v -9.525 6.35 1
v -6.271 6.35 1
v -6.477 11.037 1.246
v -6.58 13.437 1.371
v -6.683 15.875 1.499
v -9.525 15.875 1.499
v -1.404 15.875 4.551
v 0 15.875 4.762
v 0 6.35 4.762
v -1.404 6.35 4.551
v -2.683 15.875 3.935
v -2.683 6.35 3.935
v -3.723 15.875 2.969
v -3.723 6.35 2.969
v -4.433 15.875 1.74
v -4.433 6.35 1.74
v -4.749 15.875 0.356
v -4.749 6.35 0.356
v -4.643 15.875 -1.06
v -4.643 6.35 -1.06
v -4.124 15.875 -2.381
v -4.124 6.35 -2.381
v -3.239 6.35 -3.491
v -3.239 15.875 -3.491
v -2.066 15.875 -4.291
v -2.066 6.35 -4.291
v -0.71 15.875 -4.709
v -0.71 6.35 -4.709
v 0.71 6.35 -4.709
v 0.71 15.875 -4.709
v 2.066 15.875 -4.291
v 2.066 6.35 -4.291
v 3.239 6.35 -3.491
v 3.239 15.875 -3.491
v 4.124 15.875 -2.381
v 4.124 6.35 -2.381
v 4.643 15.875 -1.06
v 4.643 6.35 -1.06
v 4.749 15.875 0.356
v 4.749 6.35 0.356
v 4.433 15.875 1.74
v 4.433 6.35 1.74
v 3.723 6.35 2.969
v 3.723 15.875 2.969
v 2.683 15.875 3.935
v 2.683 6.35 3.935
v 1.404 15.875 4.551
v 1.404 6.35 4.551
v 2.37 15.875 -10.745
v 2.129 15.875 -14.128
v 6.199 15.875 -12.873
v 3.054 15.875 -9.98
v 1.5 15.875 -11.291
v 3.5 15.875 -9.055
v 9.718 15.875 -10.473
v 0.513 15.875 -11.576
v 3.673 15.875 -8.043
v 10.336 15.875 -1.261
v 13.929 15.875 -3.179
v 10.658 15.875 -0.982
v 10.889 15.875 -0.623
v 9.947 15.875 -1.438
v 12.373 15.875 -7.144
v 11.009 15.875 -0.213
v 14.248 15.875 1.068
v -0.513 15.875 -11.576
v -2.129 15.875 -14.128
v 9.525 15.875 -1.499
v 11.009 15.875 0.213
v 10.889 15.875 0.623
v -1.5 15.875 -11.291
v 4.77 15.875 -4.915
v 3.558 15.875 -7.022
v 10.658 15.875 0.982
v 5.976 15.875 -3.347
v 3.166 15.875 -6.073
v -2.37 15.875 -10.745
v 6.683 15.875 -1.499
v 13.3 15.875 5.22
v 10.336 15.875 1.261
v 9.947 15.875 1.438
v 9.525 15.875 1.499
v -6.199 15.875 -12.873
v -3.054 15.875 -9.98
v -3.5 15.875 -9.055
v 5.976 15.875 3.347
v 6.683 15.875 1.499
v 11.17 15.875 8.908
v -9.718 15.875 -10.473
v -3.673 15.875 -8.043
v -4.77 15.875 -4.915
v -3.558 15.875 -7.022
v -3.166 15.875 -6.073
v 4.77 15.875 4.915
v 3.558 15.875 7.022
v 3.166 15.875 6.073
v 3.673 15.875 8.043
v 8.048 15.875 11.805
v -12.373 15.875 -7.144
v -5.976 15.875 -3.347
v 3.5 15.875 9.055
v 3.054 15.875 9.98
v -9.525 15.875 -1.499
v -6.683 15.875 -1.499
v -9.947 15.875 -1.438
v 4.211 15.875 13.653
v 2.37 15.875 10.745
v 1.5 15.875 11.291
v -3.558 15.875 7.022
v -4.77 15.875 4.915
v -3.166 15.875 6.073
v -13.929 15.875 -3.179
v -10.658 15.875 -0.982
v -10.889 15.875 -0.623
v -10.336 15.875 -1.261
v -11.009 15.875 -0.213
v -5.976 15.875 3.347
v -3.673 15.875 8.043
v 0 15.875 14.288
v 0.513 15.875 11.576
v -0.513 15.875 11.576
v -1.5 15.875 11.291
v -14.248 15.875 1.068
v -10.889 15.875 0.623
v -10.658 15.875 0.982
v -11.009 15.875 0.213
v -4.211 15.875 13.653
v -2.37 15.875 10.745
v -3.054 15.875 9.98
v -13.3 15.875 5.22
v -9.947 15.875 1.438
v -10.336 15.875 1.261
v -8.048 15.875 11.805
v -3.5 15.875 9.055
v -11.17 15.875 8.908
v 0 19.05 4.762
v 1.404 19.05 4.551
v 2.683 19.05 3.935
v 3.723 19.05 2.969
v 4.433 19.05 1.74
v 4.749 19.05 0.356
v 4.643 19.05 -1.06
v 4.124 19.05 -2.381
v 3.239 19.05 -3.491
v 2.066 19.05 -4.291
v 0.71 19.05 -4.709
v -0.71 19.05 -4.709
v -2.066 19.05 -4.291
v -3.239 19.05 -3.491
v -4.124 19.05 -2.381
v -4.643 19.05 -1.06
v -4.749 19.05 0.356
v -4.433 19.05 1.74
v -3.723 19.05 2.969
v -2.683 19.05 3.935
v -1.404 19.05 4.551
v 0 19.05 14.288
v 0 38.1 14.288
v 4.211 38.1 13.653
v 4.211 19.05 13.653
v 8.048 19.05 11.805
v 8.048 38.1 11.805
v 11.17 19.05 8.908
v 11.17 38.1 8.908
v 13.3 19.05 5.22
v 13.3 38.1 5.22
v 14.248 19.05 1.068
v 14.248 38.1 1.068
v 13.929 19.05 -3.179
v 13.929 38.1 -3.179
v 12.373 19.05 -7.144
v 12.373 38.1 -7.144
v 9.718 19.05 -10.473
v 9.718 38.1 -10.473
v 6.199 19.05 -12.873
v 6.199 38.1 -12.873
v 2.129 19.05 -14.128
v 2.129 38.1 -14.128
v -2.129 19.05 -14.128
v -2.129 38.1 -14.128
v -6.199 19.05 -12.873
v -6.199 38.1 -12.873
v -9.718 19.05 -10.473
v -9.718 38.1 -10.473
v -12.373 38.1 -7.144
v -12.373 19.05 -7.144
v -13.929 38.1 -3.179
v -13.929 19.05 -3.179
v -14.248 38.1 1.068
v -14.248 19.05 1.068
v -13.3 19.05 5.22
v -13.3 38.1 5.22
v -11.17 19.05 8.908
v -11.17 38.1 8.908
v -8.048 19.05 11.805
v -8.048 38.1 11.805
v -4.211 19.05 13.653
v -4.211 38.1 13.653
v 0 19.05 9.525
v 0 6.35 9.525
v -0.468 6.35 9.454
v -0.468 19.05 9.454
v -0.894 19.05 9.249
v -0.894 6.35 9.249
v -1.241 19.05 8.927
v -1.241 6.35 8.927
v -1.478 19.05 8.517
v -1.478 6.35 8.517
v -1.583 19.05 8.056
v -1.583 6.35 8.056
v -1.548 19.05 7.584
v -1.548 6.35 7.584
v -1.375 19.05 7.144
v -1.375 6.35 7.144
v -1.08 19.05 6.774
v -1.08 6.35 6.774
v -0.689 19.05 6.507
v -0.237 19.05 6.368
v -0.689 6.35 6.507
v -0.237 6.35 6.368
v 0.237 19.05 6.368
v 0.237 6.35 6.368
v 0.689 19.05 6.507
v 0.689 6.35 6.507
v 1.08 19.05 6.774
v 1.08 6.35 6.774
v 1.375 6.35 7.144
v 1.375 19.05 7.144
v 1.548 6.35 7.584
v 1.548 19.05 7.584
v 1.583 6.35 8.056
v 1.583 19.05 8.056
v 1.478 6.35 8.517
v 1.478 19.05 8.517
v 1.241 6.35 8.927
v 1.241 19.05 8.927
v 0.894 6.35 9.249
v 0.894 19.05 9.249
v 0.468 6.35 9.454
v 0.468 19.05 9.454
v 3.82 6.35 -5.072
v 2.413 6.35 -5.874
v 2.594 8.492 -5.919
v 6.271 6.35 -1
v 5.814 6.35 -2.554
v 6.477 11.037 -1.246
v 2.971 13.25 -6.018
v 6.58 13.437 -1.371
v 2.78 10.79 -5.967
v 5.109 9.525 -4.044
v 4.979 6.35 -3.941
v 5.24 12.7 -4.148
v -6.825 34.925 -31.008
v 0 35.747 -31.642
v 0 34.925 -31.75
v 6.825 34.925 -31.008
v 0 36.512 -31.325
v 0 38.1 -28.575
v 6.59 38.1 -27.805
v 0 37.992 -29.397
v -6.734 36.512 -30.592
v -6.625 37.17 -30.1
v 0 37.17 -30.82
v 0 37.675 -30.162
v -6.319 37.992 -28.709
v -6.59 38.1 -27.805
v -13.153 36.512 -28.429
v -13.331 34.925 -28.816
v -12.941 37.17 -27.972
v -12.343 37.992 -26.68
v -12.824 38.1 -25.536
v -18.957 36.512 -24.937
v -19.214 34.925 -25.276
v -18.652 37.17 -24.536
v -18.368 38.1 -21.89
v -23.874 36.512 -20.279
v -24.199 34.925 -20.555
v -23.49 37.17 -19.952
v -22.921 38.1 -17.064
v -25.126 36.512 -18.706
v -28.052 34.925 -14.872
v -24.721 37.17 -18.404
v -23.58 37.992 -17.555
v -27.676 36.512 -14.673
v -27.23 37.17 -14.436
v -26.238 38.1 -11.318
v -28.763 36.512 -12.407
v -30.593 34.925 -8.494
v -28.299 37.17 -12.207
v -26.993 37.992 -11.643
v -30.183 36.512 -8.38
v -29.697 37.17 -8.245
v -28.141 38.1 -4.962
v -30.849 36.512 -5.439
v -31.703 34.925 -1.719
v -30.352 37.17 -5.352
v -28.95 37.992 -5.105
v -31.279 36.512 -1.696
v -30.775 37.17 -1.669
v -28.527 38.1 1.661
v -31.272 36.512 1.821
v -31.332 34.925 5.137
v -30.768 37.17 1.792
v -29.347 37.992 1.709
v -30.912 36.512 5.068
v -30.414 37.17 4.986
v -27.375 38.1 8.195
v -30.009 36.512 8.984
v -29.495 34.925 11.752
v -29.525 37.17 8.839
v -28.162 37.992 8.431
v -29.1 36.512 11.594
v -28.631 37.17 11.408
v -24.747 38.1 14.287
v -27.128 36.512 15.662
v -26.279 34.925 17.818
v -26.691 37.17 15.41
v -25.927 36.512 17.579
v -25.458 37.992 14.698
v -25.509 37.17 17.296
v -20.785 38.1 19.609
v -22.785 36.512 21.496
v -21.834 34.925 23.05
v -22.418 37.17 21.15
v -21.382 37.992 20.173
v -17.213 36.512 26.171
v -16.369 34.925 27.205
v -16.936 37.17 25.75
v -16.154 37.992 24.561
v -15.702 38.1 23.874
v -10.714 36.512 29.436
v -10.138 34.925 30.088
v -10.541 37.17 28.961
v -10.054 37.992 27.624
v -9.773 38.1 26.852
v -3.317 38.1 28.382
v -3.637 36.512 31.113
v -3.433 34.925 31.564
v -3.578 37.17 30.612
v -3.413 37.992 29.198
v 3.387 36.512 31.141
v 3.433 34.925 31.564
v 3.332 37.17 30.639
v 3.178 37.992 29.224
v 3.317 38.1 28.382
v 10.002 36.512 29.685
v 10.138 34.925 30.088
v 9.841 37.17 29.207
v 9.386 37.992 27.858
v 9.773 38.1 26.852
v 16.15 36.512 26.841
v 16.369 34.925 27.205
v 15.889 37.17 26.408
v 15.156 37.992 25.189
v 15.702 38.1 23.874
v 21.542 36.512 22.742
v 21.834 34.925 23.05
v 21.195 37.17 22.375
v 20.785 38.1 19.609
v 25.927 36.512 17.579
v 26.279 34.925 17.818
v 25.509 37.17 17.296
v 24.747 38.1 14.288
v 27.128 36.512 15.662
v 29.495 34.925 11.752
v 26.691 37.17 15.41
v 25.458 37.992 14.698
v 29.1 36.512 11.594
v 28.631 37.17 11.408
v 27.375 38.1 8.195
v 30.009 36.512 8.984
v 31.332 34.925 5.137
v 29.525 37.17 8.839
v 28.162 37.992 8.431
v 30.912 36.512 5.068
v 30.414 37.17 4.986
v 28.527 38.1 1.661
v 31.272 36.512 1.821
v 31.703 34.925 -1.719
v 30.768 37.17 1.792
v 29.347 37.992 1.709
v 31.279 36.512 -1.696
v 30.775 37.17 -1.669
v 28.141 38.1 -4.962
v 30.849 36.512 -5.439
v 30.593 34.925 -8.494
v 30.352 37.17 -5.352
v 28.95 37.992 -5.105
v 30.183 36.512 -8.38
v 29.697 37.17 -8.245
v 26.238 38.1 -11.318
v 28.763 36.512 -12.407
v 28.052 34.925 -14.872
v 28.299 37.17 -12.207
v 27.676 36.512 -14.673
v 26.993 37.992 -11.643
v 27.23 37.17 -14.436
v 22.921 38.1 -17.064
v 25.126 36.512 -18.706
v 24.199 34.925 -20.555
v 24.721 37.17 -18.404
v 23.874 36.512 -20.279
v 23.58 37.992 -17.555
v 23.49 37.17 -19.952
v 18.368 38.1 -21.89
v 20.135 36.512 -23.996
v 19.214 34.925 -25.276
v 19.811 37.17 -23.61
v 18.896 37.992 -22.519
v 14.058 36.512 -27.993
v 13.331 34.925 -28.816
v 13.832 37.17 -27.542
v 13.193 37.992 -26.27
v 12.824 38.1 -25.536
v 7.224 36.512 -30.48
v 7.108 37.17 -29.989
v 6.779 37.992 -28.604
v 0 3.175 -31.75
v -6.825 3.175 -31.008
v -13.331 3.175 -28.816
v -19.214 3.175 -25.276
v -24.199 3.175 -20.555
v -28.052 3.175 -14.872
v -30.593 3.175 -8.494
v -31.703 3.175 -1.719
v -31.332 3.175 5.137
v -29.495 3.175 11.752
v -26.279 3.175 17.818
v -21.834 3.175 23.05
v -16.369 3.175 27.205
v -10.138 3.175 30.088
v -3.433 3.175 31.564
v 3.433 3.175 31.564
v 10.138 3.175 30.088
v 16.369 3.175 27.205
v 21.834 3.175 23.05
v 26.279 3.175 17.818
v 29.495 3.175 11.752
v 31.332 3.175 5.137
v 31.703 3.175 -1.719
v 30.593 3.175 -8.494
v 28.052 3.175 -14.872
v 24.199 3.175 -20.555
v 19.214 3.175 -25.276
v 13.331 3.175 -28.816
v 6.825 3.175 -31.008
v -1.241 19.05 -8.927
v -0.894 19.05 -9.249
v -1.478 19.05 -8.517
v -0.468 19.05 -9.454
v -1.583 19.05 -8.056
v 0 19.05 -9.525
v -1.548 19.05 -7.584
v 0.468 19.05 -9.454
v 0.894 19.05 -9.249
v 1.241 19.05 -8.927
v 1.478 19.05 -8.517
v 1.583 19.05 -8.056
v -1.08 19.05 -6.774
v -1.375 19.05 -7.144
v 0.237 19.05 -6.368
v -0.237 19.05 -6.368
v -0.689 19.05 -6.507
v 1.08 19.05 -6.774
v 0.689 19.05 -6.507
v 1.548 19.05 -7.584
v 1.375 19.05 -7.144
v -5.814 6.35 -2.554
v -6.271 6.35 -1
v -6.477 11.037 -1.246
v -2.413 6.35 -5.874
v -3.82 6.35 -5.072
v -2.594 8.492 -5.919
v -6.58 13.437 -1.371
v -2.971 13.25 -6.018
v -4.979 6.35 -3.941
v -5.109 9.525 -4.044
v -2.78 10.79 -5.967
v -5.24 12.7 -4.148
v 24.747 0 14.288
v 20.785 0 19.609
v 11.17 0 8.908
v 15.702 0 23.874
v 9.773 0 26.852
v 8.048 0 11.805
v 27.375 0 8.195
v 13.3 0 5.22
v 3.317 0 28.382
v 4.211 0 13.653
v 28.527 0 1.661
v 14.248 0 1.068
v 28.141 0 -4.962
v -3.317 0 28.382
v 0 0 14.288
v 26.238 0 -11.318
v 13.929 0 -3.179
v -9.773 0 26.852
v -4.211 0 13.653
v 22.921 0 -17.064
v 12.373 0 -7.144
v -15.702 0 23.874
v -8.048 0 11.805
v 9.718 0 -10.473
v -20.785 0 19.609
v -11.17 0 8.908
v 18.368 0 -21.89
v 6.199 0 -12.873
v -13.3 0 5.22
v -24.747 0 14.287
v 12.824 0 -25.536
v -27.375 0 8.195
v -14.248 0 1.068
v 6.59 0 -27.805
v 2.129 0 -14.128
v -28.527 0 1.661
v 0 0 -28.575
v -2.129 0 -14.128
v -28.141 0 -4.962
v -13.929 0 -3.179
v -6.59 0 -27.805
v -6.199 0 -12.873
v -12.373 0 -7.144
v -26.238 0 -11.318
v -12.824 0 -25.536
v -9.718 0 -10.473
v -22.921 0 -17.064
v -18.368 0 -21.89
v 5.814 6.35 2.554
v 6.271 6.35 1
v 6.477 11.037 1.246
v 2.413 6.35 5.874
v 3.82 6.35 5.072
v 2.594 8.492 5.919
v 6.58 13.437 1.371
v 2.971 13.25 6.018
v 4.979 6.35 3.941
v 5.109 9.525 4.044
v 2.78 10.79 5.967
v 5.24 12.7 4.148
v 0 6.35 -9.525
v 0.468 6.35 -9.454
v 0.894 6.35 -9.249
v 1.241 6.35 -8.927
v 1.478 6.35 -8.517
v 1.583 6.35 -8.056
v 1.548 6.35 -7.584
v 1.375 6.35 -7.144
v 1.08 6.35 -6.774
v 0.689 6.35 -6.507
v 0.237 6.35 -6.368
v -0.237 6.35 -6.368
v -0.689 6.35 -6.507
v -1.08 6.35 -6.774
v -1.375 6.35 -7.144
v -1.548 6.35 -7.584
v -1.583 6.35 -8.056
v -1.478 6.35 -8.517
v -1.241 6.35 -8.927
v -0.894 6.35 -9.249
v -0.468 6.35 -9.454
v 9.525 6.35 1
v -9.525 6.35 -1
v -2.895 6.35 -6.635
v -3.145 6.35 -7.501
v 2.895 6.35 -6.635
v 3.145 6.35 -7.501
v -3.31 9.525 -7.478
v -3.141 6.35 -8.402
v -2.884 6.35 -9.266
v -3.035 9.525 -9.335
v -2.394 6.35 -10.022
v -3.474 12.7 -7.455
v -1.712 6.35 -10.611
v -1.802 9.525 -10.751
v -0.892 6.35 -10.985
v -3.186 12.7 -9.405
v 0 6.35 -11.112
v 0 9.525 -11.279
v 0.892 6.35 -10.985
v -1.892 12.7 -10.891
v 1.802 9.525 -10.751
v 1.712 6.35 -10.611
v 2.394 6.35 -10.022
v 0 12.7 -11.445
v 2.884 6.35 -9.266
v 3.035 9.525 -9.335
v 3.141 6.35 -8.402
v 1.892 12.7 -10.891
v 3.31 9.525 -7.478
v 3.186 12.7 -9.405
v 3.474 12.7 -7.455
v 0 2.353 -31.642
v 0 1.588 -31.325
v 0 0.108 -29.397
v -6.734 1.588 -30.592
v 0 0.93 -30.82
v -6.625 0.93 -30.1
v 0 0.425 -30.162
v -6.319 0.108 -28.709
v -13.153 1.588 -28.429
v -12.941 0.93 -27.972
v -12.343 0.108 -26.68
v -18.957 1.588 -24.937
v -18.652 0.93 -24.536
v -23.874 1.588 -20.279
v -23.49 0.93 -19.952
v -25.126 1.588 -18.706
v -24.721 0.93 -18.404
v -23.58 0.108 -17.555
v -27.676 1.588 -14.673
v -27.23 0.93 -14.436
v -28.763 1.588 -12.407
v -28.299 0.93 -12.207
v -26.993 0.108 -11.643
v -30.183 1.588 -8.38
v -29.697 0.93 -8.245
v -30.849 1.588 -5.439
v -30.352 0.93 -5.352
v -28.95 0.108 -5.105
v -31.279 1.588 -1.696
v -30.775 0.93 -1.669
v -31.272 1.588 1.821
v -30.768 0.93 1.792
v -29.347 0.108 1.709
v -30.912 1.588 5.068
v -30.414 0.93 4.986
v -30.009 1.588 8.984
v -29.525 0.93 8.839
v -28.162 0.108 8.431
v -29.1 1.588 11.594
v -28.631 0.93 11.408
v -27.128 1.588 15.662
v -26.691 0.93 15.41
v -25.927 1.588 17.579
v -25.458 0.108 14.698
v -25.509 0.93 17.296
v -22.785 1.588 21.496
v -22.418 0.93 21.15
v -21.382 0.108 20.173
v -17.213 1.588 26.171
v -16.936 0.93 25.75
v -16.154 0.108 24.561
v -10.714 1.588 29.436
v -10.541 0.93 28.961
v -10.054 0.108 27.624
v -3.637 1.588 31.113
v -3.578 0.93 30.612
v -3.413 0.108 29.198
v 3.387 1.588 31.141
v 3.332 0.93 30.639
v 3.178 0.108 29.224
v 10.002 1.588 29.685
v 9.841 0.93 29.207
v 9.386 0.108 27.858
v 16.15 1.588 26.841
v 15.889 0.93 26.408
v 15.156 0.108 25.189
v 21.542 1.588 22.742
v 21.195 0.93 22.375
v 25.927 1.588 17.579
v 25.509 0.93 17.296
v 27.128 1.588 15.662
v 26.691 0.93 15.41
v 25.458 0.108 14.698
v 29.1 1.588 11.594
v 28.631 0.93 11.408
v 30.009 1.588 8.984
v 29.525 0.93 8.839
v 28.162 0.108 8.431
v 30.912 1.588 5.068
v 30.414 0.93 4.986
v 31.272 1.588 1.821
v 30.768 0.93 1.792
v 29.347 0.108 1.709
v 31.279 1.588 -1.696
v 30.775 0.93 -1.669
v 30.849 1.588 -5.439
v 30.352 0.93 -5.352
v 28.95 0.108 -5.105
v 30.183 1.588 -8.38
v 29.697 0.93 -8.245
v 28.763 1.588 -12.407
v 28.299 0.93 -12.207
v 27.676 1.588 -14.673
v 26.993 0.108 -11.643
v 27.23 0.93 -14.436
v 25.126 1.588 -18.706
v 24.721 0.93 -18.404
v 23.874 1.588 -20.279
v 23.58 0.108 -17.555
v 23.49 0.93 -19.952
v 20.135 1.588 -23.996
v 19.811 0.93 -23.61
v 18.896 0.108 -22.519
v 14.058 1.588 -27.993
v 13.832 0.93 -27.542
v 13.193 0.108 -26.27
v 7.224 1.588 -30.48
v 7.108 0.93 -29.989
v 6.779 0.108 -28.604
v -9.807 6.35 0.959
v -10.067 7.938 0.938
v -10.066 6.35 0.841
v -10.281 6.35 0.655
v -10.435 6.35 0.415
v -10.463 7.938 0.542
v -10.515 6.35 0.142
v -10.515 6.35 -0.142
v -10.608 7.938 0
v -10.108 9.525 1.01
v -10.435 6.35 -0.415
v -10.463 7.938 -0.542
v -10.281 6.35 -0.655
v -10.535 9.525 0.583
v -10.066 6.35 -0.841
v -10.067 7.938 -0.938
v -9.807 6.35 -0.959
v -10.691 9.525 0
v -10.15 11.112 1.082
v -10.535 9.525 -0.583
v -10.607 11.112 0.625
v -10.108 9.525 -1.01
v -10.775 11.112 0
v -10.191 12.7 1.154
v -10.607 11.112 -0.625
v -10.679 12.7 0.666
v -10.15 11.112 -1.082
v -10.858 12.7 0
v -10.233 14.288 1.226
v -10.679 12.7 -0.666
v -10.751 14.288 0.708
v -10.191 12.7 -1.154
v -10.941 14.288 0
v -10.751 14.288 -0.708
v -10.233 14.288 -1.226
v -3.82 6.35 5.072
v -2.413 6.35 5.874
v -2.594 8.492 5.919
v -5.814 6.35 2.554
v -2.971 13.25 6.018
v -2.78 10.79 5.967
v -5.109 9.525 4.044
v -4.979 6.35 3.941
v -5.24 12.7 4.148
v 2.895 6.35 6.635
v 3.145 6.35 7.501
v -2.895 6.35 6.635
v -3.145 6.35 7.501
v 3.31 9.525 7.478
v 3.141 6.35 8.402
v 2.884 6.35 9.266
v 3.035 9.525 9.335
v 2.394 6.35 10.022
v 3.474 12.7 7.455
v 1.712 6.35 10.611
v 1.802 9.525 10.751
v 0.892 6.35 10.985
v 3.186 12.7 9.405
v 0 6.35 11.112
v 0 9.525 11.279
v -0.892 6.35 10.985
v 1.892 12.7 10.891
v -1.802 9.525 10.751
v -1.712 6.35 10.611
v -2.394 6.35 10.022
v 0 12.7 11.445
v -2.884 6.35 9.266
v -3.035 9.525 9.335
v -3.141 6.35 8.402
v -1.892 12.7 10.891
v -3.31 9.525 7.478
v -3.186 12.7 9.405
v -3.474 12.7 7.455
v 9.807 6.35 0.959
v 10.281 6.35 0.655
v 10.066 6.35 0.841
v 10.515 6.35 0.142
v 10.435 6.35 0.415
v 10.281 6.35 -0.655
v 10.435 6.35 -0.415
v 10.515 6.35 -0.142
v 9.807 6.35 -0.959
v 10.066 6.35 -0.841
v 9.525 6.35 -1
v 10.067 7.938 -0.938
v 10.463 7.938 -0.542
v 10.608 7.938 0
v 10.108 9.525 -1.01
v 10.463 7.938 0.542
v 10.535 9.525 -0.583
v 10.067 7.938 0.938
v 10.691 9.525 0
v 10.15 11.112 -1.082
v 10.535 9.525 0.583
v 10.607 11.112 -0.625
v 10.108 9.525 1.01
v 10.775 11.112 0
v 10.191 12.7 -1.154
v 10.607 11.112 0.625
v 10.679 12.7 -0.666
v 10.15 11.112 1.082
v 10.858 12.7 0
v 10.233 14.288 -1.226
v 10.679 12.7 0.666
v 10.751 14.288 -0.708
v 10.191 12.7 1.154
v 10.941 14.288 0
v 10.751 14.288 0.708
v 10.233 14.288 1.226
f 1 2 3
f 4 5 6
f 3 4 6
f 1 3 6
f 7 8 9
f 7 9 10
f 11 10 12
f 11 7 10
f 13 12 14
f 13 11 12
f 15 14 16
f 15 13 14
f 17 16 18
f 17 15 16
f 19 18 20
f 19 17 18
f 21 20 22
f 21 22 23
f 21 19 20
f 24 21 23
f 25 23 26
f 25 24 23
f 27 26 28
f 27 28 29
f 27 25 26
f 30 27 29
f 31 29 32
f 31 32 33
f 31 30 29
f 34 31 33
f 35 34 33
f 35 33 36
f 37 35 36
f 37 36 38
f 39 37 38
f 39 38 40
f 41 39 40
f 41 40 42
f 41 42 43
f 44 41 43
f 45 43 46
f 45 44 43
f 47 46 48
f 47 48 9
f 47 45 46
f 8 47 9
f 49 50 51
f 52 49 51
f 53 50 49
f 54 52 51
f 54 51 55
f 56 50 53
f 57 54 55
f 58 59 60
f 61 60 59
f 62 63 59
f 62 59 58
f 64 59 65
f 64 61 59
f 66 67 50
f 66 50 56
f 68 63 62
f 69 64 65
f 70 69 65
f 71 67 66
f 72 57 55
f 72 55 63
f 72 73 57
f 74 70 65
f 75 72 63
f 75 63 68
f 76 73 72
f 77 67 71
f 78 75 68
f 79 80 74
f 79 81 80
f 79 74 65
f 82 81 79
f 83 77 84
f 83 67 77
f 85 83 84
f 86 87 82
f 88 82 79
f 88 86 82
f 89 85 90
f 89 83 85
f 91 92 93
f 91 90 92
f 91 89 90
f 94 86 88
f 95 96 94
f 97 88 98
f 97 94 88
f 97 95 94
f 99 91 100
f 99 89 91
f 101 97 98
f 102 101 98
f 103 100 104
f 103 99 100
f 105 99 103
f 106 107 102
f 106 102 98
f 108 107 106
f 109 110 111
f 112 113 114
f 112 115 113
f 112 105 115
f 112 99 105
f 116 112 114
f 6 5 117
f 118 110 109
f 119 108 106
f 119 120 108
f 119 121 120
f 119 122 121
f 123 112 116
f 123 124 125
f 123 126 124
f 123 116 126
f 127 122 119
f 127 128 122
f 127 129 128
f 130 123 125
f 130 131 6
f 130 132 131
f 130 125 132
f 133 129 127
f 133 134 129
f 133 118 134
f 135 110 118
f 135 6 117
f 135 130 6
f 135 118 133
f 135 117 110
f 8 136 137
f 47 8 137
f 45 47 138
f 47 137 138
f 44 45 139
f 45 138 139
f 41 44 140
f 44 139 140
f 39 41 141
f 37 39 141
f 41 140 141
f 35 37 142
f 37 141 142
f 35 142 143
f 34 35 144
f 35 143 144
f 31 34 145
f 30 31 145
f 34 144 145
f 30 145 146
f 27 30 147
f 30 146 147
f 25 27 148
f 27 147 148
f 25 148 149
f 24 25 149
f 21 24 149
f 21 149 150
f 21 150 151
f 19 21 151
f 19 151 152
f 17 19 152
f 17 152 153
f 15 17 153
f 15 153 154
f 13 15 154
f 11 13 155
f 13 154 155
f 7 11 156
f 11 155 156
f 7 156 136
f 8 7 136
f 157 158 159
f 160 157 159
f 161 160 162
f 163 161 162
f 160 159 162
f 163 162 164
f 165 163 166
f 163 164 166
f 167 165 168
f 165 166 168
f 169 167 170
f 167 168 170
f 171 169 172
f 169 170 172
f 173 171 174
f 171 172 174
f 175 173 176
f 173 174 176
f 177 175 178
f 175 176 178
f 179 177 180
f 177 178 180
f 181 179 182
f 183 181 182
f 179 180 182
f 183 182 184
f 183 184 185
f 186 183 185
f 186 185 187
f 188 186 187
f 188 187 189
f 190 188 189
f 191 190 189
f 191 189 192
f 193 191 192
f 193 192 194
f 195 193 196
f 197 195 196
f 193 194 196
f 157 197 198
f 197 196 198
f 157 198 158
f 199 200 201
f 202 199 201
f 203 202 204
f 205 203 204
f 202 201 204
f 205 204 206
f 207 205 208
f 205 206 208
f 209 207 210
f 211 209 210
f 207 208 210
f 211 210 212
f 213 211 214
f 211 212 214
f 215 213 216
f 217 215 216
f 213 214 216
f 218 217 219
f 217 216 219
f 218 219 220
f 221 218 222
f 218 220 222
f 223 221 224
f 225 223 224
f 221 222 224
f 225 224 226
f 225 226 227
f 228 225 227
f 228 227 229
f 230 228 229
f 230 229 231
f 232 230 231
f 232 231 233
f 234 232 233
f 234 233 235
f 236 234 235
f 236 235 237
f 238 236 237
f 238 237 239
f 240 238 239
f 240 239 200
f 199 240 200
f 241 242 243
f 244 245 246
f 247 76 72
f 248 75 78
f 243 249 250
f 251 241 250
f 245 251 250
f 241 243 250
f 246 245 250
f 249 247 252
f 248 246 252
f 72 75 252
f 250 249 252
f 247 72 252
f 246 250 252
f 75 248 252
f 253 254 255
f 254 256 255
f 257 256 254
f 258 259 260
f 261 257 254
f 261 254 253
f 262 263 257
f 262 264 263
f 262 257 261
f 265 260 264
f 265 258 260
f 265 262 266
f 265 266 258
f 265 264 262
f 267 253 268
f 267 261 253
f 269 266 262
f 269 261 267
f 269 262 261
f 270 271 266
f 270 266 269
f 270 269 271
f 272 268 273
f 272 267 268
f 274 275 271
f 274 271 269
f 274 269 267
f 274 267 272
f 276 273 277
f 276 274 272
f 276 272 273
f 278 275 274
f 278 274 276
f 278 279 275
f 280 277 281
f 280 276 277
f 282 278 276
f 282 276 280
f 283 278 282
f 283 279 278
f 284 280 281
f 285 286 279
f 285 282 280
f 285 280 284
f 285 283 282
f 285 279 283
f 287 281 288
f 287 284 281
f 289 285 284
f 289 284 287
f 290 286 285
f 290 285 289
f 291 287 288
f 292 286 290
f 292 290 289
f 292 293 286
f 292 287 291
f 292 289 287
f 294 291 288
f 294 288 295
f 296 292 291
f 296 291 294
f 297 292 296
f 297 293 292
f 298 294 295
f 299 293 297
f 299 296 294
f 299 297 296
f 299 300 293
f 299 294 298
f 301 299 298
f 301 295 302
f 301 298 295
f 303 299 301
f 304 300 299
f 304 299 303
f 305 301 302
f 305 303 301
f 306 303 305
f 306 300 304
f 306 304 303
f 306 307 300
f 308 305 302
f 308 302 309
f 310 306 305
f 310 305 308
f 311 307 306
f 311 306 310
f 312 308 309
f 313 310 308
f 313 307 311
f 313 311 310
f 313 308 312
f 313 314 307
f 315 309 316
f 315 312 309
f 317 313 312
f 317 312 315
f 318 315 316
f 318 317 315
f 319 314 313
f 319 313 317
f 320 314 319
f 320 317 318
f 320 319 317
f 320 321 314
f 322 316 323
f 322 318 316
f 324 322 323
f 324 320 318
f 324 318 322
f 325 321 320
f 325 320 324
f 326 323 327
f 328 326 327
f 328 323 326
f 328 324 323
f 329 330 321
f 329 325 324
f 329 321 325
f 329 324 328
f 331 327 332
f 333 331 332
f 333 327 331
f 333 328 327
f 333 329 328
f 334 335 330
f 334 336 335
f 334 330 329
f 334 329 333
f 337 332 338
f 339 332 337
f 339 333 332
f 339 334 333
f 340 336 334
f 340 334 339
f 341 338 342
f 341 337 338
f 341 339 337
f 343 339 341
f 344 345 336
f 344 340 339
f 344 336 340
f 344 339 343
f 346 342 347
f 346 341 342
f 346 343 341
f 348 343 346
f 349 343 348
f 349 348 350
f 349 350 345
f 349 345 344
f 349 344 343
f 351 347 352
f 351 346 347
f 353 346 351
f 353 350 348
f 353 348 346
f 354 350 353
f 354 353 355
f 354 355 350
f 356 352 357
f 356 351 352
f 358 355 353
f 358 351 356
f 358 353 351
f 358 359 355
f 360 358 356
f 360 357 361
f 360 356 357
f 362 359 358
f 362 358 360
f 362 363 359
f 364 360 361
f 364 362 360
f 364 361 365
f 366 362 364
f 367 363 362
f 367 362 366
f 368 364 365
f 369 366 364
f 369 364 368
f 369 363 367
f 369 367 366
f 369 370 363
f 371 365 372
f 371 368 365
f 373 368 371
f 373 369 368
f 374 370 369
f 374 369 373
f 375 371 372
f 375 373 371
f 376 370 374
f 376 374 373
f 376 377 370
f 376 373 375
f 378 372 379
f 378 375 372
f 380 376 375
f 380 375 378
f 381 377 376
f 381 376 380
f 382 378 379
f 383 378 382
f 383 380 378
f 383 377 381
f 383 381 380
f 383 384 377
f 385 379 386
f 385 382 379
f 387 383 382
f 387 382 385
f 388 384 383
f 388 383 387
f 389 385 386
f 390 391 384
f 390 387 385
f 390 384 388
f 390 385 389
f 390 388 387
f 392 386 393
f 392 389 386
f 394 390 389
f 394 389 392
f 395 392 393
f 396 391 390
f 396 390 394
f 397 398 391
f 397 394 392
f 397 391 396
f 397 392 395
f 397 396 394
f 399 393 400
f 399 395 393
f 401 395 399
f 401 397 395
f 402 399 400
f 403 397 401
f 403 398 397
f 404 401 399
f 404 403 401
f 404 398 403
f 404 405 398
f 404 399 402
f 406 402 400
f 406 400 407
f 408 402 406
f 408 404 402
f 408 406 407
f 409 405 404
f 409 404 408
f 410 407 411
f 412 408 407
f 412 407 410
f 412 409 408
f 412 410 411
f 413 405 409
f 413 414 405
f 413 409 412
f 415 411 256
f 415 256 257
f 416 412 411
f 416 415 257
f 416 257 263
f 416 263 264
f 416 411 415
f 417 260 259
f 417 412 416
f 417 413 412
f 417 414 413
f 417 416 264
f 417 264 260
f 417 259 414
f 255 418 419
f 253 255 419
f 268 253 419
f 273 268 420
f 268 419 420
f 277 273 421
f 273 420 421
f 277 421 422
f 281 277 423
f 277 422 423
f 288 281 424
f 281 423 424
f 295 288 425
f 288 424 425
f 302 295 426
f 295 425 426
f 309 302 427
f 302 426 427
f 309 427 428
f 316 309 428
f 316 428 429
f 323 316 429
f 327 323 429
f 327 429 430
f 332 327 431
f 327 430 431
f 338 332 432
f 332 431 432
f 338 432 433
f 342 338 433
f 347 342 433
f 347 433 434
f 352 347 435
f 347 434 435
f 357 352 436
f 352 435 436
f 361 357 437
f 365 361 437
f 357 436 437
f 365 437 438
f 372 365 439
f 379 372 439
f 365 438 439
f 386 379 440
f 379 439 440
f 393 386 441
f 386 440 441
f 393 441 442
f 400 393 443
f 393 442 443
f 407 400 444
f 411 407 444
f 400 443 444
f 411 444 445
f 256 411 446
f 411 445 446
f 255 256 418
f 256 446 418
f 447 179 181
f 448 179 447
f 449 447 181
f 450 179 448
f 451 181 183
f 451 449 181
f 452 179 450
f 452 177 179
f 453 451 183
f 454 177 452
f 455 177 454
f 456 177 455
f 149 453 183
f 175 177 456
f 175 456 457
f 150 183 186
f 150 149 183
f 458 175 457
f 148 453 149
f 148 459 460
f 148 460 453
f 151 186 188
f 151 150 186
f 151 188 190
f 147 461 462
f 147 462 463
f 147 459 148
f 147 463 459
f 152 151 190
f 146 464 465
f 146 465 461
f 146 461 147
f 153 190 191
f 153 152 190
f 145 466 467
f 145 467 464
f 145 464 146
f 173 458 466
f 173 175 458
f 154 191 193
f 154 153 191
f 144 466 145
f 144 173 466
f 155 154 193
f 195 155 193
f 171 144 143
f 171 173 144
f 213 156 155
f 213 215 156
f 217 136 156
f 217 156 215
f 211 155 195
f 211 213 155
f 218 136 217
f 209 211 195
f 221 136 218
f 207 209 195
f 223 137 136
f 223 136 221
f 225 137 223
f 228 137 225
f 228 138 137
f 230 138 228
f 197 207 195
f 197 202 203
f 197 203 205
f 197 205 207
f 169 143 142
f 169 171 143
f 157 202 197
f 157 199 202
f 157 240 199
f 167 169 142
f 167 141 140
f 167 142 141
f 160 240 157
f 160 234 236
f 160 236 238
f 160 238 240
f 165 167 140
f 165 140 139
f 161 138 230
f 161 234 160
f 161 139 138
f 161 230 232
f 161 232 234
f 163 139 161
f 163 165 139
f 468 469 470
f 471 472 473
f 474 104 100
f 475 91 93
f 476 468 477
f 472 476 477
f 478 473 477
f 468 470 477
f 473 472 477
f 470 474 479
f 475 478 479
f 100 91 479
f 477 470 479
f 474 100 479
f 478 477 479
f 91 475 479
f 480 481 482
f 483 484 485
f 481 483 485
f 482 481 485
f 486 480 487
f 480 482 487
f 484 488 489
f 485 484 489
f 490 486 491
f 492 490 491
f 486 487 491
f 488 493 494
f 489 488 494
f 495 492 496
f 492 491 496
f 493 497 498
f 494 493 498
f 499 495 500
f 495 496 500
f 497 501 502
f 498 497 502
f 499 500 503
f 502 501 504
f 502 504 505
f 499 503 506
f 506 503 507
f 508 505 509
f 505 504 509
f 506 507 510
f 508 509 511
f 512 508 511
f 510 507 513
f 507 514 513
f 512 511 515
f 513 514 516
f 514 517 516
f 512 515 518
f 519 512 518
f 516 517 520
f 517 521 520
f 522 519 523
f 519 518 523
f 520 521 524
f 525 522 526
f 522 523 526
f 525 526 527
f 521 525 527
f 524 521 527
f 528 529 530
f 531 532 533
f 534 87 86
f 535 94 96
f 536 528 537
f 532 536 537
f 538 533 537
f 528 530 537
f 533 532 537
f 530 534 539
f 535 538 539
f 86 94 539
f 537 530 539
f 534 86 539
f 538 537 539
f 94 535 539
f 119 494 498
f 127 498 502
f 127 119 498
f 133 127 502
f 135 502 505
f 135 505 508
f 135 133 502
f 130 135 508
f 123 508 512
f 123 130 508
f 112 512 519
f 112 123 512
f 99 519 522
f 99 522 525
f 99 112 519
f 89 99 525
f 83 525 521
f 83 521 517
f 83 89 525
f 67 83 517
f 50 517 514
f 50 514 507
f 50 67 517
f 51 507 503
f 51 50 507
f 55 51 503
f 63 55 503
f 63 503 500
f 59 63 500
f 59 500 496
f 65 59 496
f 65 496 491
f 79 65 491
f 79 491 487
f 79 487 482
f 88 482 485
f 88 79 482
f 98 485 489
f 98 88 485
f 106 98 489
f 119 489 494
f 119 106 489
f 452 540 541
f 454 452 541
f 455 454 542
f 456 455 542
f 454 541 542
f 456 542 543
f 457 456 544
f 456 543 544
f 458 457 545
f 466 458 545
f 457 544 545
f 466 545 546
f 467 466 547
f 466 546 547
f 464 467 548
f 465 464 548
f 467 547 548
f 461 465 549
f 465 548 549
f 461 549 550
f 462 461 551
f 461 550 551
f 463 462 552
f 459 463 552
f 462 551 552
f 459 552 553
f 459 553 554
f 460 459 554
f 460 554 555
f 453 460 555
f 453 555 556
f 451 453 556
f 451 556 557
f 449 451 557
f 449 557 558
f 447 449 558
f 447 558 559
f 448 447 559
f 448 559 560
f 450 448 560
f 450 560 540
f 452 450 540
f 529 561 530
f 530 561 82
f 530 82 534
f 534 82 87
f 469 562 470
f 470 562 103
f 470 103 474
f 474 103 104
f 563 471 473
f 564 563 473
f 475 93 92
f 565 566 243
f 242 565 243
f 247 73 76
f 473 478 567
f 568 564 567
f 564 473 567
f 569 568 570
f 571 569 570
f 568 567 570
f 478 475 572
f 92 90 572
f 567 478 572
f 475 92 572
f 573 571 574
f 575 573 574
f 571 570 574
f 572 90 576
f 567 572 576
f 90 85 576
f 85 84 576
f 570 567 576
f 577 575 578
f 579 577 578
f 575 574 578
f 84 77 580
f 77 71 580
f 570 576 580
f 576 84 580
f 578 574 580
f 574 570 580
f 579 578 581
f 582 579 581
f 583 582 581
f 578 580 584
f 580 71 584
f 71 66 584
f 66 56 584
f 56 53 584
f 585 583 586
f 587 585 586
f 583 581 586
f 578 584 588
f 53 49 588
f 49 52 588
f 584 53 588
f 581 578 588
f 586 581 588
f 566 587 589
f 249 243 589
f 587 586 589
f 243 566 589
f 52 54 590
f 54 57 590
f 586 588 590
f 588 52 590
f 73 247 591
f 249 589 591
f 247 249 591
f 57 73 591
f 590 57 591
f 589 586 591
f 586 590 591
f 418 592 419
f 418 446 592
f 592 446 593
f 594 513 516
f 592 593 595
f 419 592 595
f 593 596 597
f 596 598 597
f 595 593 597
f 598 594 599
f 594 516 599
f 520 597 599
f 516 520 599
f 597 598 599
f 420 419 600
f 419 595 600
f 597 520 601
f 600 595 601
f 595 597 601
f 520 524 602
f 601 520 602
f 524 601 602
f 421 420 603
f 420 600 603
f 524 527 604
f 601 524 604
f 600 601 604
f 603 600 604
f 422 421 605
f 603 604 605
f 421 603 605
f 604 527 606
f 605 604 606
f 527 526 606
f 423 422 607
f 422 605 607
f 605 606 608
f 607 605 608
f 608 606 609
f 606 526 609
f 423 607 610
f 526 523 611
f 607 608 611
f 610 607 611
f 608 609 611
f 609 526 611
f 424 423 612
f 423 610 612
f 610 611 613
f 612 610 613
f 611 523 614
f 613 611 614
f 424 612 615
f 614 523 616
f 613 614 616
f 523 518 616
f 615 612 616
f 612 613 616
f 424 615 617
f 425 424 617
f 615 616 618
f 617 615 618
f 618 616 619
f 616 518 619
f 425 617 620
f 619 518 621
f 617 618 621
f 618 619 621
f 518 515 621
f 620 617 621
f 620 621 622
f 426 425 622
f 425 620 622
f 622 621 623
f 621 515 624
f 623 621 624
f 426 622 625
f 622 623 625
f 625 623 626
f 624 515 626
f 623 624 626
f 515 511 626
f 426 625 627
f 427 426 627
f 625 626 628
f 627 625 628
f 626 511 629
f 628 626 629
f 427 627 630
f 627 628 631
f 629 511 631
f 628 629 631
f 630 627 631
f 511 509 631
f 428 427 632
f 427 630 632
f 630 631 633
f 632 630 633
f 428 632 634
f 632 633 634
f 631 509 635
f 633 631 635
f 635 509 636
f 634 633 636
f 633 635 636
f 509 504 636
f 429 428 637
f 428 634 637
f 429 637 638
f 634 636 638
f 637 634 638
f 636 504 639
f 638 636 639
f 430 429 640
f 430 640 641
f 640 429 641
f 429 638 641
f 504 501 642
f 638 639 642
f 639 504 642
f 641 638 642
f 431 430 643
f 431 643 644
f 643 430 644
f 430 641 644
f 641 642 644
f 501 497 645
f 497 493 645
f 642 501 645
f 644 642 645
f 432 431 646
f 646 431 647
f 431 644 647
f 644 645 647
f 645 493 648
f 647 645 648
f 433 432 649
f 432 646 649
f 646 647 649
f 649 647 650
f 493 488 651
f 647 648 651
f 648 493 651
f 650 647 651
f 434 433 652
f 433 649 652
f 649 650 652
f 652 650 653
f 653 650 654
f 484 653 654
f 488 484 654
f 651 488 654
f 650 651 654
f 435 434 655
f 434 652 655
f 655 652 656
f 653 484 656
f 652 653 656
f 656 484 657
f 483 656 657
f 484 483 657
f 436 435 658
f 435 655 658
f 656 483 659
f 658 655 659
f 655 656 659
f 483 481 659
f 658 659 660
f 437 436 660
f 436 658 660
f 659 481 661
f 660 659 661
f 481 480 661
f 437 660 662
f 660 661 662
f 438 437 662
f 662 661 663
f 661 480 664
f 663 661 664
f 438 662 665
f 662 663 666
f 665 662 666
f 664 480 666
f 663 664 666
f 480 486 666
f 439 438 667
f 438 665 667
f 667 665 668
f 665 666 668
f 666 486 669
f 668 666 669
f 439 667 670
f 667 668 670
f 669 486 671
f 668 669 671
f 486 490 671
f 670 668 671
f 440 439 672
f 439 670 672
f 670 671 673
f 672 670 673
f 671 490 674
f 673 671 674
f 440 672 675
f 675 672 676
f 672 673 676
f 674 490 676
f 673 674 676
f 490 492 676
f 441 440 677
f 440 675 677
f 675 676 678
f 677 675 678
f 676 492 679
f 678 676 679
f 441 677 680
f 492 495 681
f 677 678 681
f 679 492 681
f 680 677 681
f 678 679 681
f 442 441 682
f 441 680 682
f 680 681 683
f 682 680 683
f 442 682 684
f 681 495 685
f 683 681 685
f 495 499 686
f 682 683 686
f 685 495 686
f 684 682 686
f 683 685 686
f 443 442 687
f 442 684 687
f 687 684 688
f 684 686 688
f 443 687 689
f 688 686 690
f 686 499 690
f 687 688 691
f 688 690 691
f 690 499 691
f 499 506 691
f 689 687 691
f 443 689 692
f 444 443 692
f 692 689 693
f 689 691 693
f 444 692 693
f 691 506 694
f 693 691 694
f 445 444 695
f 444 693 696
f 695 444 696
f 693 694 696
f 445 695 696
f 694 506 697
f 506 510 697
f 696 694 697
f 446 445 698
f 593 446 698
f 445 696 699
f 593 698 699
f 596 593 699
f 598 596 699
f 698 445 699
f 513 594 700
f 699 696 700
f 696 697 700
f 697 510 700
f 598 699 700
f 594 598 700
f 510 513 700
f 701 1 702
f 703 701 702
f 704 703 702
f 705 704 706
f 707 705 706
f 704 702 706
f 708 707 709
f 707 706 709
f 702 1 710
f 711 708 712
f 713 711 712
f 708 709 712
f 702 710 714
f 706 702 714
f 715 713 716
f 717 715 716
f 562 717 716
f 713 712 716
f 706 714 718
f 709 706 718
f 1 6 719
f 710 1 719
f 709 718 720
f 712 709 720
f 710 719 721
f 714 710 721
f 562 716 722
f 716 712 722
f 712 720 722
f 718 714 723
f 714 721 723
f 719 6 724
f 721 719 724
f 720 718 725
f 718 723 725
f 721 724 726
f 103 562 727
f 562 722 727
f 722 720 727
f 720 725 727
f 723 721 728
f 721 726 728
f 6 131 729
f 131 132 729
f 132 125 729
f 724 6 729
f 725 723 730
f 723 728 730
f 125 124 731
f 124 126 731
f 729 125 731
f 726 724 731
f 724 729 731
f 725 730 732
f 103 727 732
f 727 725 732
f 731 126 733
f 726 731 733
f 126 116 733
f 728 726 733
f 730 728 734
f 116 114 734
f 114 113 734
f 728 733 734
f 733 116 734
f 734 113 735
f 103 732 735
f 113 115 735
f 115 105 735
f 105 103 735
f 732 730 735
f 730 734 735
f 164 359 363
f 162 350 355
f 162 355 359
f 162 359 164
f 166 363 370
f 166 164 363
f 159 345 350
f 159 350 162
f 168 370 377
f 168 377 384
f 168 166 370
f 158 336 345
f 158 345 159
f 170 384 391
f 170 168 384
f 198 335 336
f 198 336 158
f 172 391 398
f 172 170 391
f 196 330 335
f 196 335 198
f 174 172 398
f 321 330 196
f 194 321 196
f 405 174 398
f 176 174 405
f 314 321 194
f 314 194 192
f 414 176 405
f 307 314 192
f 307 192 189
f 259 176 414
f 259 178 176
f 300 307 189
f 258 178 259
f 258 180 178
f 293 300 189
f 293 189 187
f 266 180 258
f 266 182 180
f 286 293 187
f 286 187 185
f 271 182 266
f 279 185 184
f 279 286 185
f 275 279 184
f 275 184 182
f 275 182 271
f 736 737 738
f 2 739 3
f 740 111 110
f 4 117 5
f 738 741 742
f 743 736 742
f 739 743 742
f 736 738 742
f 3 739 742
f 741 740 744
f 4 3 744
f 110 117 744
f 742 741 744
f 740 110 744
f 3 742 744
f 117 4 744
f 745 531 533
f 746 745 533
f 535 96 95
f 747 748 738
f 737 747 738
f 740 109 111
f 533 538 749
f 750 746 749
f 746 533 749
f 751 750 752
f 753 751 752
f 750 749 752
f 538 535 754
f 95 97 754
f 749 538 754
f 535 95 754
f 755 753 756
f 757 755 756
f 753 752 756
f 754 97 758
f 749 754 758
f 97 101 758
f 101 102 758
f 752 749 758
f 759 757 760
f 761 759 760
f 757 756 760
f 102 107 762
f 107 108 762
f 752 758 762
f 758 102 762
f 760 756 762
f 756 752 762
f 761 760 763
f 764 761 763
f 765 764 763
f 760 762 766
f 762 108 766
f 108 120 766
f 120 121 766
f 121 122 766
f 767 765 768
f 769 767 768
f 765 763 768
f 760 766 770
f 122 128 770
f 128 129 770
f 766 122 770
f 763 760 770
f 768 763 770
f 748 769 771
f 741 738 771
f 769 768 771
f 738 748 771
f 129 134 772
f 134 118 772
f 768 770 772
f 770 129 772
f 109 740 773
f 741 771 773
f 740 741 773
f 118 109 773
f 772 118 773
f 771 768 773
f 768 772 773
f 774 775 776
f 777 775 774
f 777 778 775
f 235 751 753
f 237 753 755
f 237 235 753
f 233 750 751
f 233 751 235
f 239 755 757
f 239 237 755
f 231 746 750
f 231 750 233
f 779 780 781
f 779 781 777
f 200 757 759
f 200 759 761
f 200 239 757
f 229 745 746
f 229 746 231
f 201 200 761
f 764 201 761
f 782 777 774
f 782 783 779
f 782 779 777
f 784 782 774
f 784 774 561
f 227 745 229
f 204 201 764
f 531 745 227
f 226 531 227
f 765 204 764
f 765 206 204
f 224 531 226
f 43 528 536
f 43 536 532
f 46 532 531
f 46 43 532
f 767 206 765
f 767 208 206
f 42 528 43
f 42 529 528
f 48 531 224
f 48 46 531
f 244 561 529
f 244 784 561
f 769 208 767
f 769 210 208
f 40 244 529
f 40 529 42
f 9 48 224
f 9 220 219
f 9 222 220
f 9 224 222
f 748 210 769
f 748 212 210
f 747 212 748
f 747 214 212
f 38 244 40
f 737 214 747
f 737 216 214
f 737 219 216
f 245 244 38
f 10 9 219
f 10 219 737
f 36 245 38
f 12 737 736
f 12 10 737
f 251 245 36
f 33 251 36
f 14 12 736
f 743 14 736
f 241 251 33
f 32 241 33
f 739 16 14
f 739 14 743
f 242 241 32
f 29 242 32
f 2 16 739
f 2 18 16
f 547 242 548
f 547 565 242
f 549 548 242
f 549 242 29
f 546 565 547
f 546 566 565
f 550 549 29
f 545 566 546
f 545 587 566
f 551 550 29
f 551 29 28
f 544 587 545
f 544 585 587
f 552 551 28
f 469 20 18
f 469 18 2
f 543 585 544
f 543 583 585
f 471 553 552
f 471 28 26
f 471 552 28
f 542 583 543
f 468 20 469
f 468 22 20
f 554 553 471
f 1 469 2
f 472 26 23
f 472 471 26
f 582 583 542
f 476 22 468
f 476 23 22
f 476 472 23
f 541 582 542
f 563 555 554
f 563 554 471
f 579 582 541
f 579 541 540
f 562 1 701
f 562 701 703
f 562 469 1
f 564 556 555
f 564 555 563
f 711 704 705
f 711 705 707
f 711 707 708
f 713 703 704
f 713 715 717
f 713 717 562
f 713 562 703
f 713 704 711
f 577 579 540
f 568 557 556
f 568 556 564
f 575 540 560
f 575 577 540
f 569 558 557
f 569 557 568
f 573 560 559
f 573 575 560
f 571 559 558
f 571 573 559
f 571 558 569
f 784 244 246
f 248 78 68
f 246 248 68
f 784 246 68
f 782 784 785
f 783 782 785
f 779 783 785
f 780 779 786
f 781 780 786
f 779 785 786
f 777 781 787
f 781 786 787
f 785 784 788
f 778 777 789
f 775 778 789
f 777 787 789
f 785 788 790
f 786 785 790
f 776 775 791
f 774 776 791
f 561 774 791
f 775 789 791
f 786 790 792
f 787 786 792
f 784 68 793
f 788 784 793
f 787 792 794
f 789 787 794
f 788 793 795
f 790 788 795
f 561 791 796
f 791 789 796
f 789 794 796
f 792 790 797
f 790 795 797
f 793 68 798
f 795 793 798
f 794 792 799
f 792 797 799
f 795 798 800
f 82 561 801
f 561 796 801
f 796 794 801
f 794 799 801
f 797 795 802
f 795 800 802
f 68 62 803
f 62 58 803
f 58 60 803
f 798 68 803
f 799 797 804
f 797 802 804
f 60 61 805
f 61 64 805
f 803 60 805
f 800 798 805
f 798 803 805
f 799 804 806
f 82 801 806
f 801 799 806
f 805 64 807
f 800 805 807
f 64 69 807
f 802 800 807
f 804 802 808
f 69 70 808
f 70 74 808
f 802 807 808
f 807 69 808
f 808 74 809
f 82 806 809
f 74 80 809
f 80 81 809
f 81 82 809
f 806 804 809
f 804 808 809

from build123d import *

# Parameters (mm, degrees)
SKETCH1_R           = 31.75
BOSS_EXTRUDE1_DEPTH = 38.1
FILLET1_R           = 3.175
SKETCH2_R           = 14.2875
CUT_EXTRUDE1_DEPTH  = 19.05
SKETCH3_R           = 4.7625
CUT_EXTRUDE2_DEPTH  = 3.175
SKETCH4_R           = 3.175
CUT_EXTRUDE3_DEPTH  = 51.100654936
CUT_EXTRUDE4_START  = -15.875
SKETCH5_R           = 14.2875
CUT_EXTRUDE4_DEPTH  = 15.875
SKETCH6_R           = 4.7625
BOSS_EXTRUDE2_DEPTH = 9.525
DRAFT2_ANGLE        = 3
SKETCH7_R           = 1.5875
CUT_EXTRUDE5_DEPTH  = 55.99261314


with BuildPart() as part:
    # Sketch1 → Boss-Extrude1 (new body)
    with BuildSketch(Plane(origin=(0, 0, 0), x_dir=(1, 0, 0), z_dir=(0, 1, 0))):
        with Locations(Location((0, 0, 0), (0, 0, 90))):
            Circle(SKETCH1_R)
    extrude(amount=BOSS_EXTRUDE1_DEPTH)

    # Fillet1
    fillet1_edges = [part.edges().sort_by_distance(p)[0] for p in [
        (0, 0, 31.75),
        (0, 38.1, 31.75),
    ]]
    fillet(fillet1_edges, radius=FILLET1_R)

    # Sketch2 → Cut-Extrude1 (cut)
    with BuildSketch(Plane(origin=(0, 38.1, 0), x_dir=(1, 0, 0), z_dir=(0, 1, 0))):
        with Locations(Location((0, 0, 0), (0, 0, 270))):
            Circle(SKETCH2_R)
    extrude(amount=-CUT_EXTRUDE1_DEPTH, mode=Mode.SUBTRACT)

    # Sketch3 → Cut-Extrude2 (cut)
    with BuildSketch(Plane(origin=(0, 19.05, 0), x_dir=(1, 0, 0), z_dir=(0, 1, 0))):
        with Locations(Location((0, 0, 0), (0, 0, 270))):
            Circle(SKETCH3_R)
    extrude(amount=-CUT_EXTRUDE2_DEPTH, mode=Mode.SUBTRACT)

    # Sketch4 → Cut-Extrude3 (cut, through all)
    with BuildSketch(Plane(origin=(0, 15.875, 0), x_dir=(1, 0, 0), z_dir=(0, 1, 0))):
        with Locations(Location((0, 0, 0), (0, 0, 270))):
            Circle(SKETCH4_R)
    extrude(amount=-CUT_EXTRUDE3_DEPTH, mode=Mode.SUBTRACT)

    # Sketch5 → Cut-Extrude4 (cut)
    with BuildSketch(Plane.XZ.offset(CUT_EXTRUDE4_START)):
        with Locations(Location((0, 0, 0), (0, 0, 90))):
            Circle(SKETCH5_R)
    extrude(amount=CUT_EXTRUDE4_DEPTH, mode=Mode.SUBTRACT)

    # Sketch6 → Boss-Extrude2 (add)
    with BuildSketch(Plane(origin=(0, 15.875, 0), x_dir=(-1, 0, 0), z_dir=(0, -1, 0))):
        with BuildLine():
            Line((-9.525, -1), (-6.270765504, -1))
            ThreePointArc((-6.270765504, -1), (-4.978895322, -3.941205573), (-2.412791109, -5.87375))
            ThreePointArc((-2.412791109, -5.87375), (0, -11.1125), (2.412791109, -5.87375))
            ThreePointArc((2.412791109, -5.87375), (4.978895322, -3.941205573), (6.270765504, -1))
            Line((6.270765504, -1), (9.525, -1))
            ThreePointArc((9.525, -1), (10.525, 0), (9.525, 1))
            Line((9.525, 1), (6.270765504, 1))
            ThreePointArc((6.270765504, 1), (4.978895322, 3.941205573), (2.412791109, 5.87375))
            ThreePointArc((2.412791109, 5.87375), (0, 11.1125), (-2.412791109, 5.87375))
            ThreePointArc((-2.412791109, 5.87375), (-4.978895322, 3.941205573), (-6.270765504, 1))
            Line((-6.270765504, 1), (-9.525, 1))
            ThreePointArc((-9.525, 1), (-10.525, 0), (-9.525, -1))
        make_face()
        with Locations(Location((0, 0, 0), (0, 0, 270))):
            Circle(SKETCH6_R, mode=Mode.SUBTRACT)
    extrude(amount=BOSS_EXTRUDE2_DEPTH)

    # Draft2
    draft2_faces = [part.faces().sort_by_distance(p)[0] for p in [
        (10.525, 11.1125, 0),
        (4.978895322, 11.1125, 3.941205573),
        (7.897882752, 11.1125, 1),
        (7.897882752, 11.1125, -1),
        (4.978895322, 11.1125, -3.941205573),
        (0, 11.1125, -11.1125),
        (-7.897882752, 11.1125, 1),
        (-7.897882752, 11.1125, -1),
        (-10.525, 11.1125, 0),
        (-4.978895322, 11.1125, -3.941205573),
        (-4.978895322, 11.1125, 3.941205573),
        (0, 11.1125, 11.1125),
    ]]
    draft(draft2_faces, Plane(origin=(0, 6.35, 0), x_dir=(0, 0, -1), z_dir=(0, -1, 0)), DRAFT2_ANGLE)

    # Sketch7 → Cut-Extrude5 (cut, through all)
    with BuildSketch(Plane(origin=(0, 6.35, 0), x_dir=(-1, 0, 0), z_dir=(0, -1, 0))):
        with Locations(Location((0, 7.9375, 0), (0, 0, 90))):
            Circle(SKETCH7_R)
        with Locations(Location((0, -7.9375, 0), (0, 0, 270))):
            Circle(SKETCH7_R)
    extrude(amount=-CUT_EXTRUDE5_DEPTH, mode=Mode.SUBTRACT)


solid = part.part
